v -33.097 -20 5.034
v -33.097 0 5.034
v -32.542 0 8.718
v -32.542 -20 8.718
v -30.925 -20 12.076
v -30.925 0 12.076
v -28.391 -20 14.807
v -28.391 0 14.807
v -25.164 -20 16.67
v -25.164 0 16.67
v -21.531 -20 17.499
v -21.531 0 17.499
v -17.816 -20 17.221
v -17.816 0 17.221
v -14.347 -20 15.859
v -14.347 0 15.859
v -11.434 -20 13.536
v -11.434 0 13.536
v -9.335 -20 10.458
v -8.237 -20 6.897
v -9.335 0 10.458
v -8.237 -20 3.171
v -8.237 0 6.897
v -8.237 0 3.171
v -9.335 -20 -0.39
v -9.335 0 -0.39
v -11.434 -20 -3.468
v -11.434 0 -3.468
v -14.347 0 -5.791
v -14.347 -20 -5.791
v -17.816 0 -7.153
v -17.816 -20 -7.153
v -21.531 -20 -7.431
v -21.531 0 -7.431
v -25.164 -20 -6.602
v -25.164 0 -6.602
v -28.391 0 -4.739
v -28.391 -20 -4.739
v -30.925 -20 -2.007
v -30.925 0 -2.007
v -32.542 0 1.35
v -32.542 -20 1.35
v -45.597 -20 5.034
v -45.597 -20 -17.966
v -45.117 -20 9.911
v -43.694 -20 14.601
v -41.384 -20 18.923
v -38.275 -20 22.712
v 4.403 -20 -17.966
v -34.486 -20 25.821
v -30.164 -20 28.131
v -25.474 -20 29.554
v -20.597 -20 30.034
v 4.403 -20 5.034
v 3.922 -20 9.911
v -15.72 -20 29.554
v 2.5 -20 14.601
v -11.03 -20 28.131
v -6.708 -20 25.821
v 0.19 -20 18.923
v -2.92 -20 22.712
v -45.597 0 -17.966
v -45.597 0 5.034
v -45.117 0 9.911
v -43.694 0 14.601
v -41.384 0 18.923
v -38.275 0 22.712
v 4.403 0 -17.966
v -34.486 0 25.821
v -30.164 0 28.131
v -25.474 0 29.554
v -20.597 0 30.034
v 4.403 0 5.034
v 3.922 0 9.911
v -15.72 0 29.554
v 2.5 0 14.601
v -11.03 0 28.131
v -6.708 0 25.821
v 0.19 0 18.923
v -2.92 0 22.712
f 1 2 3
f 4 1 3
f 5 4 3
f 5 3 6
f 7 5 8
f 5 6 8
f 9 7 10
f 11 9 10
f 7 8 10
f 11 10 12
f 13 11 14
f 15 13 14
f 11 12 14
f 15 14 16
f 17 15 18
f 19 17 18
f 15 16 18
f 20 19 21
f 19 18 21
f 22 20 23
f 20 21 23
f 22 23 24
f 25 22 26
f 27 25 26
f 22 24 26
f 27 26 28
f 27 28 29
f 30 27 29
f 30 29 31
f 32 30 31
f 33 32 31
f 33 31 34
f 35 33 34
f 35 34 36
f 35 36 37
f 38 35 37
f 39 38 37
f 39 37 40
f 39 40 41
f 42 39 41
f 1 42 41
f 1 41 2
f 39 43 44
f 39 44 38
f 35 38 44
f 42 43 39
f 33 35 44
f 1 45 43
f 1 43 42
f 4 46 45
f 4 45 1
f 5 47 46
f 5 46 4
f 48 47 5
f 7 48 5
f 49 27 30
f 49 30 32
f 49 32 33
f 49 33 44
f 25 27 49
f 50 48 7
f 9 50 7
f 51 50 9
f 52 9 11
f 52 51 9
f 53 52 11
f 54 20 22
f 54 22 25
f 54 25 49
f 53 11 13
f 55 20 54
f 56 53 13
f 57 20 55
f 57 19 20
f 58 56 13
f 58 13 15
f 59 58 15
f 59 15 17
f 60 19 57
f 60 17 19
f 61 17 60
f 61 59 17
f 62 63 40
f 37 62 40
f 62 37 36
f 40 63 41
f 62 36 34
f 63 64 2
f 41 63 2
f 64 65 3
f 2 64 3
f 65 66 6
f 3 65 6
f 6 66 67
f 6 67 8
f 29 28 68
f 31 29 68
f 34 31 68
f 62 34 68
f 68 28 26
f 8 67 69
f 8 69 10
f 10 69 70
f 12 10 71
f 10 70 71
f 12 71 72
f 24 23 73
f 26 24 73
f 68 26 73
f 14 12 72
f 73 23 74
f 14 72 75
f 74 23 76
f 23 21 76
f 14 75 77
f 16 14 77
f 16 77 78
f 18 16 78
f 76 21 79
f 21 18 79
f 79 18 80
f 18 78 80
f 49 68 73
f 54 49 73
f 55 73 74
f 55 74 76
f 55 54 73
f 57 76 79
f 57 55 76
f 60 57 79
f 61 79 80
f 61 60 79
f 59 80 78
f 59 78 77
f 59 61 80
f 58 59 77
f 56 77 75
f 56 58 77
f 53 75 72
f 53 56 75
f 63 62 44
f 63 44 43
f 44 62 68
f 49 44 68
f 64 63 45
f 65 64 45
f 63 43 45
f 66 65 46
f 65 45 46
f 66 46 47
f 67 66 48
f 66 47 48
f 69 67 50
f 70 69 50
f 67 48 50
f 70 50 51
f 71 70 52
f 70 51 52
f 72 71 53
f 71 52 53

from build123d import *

# Parameters (mm, degrees)
F0_W     = 50
F0_H     = 48
F1_DEPTH = 20
F2_R     = 24.99999
F3_R     = 12.5
F4_DEPTH = 25


# Not quite as in the source:
# - a fillet or chamfer is up to 0.001 mm smaller than in the source, because OpenCascade refuses the exact size


with BuildPart() as f1:
    # F0 (on Front) → F1 (new body)
    with BuildSketch(Plane.XZ):
        with Locations((-20.5971896648, 6.0340394775)):
            Rectangle(F0_W, F0_H)
    extrude(amount=F1_DEPTH)

    # F2 (radius 25 in the source; OpenCascade refuses exactly that, so slightly less here)
    f2_edges = [f1.edges().sort_by_distance(p)[0] for p in [
        (4.40281, -10, 30.034039),
        (-45.59719, -10, 30.034039),
    ]]
    fillet(f2_edges, radius=F2_R)

    # F3 (on face) → F4 (cut)
    with BuildSketch(Plane(origin=(0, 0, 0), x_dir=(-1, 0, 0), z_dir=(0, 1, 0))):
        with Locations((20.5971896648, 5.0340394775)):
            Circle(F3_R)
    extrude(amount=-F4_DEPTH, mode=Mode.SUBTRACT)


solid = f1.part
